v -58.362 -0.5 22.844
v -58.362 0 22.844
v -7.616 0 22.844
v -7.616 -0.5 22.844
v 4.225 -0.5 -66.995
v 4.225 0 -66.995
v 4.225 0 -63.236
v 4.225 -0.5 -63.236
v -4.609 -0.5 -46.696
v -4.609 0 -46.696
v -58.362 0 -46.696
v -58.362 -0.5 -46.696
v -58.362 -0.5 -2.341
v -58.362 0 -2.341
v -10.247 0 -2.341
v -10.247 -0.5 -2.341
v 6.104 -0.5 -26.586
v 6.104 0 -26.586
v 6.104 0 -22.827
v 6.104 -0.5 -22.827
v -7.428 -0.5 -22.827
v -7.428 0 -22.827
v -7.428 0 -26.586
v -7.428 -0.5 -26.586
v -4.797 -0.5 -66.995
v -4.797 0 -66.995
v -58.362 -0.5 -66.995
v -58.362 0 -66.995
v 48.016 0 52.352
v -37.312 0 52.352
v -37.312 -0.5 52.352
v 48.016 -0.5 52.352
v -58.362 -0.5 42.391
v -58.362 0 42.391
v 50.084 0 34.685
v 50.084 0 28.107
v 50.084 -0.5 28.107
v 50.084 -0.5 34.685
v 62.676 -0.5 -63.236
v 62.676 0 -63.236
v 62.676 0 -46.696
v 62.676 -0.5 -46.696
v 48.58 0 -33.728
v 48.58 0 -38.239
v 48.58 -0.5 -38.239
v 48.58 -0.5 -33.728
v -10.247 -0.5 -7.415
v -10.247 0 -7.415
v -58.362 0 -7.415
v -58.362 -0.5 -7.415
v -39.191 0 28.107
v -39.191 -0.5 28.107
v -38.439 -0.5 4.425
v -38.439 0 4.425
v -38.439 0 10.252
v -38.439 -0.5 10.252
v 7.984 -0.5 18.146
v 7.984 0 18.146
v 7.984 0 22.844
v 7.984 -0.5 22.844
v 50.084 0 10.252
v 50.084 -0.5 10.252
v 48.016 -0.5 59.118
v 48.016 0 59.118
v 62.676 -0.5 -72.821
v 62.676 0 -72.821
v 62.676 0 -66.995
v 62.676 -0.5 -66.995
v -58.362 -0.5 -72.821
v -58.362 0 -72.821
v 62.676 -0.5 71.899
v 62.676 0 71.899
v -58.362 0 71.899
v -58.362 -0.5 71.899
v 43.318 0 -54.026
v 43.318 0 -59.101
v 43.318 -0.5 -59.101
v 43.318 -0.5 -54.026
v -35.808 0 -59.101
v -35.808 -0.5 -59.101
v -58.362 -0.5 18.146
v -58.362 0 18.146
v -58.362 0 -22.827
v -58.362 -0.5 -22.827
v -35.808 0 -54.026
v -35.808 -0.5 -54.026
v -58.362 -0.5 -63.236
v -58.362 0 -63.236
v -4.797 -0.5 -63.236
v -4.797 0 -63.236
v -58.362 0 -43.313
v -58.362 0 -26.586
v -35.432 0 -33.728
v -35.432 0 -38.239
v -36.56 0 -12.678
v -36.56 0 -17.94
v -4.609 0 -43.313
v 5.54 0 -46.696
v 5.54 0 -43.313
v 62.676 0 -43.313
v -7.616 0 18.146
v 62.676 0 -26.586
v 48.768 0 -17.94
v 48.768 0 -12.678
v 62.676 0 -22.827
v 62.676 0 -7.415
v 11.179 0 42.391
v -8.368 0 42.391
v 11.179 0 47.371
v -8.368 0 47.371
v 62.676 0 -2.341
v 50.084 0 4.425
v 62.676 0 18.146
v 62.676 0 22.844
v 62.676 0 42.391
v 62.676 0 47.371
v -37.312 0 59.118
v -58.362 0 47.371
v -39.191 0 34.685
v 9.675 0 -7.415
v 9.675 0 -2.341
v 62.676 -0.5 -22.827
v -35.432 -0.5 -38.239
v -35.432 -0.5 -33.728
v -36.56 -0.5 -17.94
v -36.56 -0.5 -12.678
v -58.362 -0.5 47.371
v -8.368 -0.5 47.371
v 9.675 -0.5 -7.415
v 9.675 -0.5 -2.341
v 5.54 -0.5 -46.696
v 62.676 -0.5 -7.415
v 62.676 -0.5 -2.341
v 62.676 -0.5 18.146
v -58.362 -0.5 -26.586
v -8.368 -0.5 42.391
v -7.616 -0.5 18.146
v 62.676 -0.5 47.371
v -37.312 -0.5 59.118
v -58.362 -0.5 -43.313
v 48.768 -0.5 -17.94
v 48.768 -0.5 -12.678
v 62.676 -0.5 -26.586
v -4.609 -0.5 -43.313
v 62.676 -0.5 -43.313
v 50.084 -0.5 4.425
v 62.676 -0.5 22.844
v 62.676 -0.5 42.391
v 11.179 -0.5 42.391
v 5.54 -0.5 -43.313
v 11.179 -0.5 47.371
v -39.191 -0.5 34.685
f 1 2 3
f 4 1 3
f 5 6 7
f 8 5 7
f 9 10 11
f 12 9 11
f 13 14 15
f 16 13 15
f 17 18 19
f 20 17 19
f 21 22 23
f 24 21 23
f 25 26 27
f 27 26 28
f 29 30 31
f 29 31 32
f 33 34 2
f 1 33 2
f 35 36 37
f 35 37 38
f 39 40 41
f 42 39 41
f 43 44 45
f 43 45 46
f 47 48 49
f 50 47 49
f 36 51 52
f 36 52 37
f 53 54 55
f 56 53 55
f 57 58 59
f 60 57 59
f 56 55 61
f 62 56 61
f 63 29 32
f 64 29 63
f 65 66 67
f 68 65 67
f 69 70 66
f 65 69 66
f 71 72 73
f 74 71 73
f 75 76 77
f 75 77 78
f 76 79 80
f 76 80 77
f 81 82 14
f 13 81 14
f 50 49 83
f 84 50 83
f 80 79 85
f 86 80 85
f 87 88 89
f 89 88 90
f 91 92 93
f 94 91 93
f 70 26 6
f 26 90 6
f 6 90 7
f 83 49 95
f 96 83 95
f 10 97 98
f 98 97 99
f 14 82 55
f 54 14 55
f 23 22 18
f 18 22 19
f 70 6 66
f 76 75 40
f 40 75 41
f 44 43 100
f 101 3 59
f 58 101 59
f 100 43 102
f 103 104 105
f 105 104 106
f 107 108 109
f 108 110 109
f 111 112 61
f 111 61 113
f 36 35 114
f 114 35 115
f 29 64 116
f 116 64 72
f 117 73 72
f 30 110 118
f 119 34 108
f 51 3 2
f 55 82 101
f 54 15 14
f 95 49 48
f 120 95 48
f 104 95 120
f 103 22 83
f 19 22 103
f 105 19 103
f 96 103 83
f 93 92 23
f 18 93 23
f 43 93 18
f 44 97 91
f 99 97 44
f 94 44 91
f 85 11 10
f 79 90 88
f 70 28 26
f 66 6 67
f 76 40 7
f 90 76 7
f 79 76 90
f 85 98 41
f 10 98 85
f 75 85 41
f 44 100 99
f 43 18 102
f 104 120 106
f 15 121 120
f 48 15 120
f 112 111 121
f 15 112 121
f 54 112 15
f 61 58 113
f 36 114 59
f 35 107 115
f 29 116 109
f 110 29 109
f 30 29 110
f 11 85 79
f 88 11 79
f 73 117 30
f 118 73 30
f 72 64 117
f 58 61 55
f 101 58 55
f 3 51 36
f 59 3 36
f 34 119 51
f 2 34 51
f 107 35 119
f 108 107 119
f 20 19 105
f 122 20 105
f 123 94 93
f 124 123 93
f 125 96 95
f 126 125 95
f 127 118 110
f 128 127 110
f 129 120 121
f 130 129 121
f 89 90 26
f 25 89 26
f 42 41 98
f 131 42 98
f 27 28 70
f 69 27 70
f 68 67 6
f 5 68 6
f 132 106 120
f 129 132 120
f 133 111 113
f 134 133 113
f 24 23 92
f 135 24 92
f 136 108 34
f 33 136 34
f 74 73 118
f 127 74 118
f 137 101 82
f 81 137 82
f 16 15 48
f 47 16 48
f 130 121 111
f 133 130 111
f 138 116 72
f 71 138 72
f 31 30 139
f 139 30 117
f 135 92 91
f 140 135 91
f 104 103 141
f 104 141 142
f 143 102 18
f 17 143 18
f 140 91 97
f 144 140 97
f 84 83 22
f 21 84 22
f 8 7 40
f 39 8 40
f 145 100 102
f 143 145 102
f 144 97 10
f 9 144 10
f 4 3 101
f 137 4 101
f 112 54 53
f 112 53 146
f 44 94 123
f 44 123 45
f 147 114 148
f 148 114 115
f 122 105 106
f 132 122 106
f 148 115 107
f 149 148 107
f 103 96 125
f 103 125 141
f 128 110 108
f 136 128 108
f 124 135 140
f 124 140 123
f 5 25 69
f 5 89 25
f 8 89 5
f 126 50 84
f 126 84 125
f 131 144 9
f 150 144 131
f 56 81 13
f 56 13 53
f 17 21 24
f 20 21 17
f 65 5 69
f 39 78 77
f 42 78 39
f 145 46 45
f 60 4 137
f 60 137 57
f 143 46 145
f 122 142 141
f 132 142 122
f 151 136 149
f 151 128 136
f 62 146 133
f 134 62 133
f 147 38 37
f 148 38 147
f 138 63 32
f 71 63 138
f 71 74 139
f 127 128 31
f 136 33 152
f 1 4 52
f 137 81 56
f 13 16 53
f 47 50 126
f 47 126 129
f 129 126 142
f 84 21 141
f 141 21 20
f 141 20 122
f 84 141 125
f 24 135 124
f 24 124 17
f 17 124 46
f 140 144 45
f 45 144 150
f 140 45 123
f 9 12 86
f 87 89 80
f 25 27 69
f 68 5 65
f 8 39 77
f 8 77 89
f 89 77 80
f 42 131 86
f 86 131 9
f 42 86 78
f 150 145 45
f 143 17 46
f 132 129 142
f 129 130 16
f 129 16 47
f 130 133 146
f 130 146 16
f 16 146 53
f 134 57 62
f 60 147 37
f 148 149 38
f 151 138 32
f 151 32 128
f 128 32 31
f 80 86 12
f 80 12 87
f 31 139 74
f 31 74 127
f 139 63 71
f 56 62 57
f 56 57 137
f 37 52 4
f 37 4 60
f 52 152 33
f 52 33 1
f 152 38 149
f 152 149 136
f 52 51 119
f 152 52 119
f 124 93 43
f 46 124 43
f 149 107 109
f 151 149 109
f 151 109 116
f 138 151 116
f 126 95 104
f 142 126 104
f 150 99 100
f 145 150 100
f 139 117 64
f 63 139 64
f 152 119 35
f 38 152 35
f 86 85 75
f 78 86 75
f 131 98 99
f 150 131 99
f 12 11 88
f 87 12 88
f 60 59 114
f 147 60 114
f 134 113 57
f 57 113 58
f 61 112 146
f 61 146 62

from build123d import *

# Parameters (mm, degrees)
F0_W     = 79.1259
F0_H     = 5.074583
F0_W_2   = 84.01253
F0_H_2   = 4.510738
F0_W_3   = 85.328166
F0_H_3   = 5.262531
F0_W_4   = 88.523269
F0_H_4   = 5.826373
F0_W_5   = 89.275062
F0_H_5   = 6.578165
F0_W_6   = 85.328165
F0_H_6   = 6.766111
F1_DEPTH = 0.5


with BuildPart() as f1:
    # F0 (on Front) → F1 (new body)
    with BuildSketch(Plane.XZ):
        Polygon((62.676273, 71.898557), (-58.361914, 71.898557), (-58.361914, 47.371406), (-8.367877, 47.371406), (-8.367877, 42.390797), (-58.361914, 42.390797), (-58.361914, 22.844255), (-7.616087, 22.844255), (-7.616087, 18.145567), (-58.361914, 18.145567), (-58.361914, -2.34071), (-10.247352, -2.34071), (-10.247352, -7.415293), (-58.361914, -7.415293), (-58.361914, -22.826988), (-7.428139, -22.826988), (-7.428139, -26.585938), (-58.361914, -26.585938), (-58.361914, -43.313265), (-4.608927, -43.313265), (-4.608927, -46.69632), (-58.361914, -46.69632), (-58.361914, -63.2357), (-4.796875, -63.2357), (-4.796875, -66.994652), (-58.361914, -66.994652), (-58.361914, -72.821021), (62.676273, -72.821021), (62.676273, -66.994652), (4.224605, -66.994652), (4.224605, -63.2357), (62.676273, -63.2357), (62.676273, -46.69632), (5.540238, -46.69632), (5.540238, -43.313265), (62.676273, -43.313265), (62.676273, -26.585938), (6.10408, -26.585938), (6.10408, -22.826988), (62.676273, -22.826988), (62.676273, -7.415293), (9.675083, -7.415293), (9.675083, -2.34071), (62.676273, -2.34071), (62.676273, 18.145567), (7.983554, 18.145567), (7.983554, 22.844255), (62.676273, 22.844255), (62.676273, 42.390797), (11.178663, 42.390797), (11.178663, 47.371406), (62.676273, 47.371406), align=None)
        with Locations((3.754737, -56.563564)):
            Rectangle(F0_W, F0_H, mode=Mode.SUBTRACT)
        with Locations((6.573949, -35.983313)):
            Rectangle(F0_W_2, F0_H_2, mode=Mode.SUBTRACT)
        with Locations((6.10408, -15.309088)):
            Rectangle(F0_W_3, F0_H_3, mode=Mode.SUBTRACT)
        with Locations((5.822159, 7.338586)):
            Rectangle(F0_W_4, F0_H_4, mode=Mode.SUBTRACT)
        with Locations((5.446263, 31.395866)):
            Rectangle(F0_W_5, F0_H_5, mode=Mode.SUBTRACT)
        with Locations((5.35229, 55.73507)):
            Rectangle(F0_W_6, F0_H_6, mode=Mode.SUBTRACT)
    extrude(amount=F1_DEPTH)


solid = f1.part
